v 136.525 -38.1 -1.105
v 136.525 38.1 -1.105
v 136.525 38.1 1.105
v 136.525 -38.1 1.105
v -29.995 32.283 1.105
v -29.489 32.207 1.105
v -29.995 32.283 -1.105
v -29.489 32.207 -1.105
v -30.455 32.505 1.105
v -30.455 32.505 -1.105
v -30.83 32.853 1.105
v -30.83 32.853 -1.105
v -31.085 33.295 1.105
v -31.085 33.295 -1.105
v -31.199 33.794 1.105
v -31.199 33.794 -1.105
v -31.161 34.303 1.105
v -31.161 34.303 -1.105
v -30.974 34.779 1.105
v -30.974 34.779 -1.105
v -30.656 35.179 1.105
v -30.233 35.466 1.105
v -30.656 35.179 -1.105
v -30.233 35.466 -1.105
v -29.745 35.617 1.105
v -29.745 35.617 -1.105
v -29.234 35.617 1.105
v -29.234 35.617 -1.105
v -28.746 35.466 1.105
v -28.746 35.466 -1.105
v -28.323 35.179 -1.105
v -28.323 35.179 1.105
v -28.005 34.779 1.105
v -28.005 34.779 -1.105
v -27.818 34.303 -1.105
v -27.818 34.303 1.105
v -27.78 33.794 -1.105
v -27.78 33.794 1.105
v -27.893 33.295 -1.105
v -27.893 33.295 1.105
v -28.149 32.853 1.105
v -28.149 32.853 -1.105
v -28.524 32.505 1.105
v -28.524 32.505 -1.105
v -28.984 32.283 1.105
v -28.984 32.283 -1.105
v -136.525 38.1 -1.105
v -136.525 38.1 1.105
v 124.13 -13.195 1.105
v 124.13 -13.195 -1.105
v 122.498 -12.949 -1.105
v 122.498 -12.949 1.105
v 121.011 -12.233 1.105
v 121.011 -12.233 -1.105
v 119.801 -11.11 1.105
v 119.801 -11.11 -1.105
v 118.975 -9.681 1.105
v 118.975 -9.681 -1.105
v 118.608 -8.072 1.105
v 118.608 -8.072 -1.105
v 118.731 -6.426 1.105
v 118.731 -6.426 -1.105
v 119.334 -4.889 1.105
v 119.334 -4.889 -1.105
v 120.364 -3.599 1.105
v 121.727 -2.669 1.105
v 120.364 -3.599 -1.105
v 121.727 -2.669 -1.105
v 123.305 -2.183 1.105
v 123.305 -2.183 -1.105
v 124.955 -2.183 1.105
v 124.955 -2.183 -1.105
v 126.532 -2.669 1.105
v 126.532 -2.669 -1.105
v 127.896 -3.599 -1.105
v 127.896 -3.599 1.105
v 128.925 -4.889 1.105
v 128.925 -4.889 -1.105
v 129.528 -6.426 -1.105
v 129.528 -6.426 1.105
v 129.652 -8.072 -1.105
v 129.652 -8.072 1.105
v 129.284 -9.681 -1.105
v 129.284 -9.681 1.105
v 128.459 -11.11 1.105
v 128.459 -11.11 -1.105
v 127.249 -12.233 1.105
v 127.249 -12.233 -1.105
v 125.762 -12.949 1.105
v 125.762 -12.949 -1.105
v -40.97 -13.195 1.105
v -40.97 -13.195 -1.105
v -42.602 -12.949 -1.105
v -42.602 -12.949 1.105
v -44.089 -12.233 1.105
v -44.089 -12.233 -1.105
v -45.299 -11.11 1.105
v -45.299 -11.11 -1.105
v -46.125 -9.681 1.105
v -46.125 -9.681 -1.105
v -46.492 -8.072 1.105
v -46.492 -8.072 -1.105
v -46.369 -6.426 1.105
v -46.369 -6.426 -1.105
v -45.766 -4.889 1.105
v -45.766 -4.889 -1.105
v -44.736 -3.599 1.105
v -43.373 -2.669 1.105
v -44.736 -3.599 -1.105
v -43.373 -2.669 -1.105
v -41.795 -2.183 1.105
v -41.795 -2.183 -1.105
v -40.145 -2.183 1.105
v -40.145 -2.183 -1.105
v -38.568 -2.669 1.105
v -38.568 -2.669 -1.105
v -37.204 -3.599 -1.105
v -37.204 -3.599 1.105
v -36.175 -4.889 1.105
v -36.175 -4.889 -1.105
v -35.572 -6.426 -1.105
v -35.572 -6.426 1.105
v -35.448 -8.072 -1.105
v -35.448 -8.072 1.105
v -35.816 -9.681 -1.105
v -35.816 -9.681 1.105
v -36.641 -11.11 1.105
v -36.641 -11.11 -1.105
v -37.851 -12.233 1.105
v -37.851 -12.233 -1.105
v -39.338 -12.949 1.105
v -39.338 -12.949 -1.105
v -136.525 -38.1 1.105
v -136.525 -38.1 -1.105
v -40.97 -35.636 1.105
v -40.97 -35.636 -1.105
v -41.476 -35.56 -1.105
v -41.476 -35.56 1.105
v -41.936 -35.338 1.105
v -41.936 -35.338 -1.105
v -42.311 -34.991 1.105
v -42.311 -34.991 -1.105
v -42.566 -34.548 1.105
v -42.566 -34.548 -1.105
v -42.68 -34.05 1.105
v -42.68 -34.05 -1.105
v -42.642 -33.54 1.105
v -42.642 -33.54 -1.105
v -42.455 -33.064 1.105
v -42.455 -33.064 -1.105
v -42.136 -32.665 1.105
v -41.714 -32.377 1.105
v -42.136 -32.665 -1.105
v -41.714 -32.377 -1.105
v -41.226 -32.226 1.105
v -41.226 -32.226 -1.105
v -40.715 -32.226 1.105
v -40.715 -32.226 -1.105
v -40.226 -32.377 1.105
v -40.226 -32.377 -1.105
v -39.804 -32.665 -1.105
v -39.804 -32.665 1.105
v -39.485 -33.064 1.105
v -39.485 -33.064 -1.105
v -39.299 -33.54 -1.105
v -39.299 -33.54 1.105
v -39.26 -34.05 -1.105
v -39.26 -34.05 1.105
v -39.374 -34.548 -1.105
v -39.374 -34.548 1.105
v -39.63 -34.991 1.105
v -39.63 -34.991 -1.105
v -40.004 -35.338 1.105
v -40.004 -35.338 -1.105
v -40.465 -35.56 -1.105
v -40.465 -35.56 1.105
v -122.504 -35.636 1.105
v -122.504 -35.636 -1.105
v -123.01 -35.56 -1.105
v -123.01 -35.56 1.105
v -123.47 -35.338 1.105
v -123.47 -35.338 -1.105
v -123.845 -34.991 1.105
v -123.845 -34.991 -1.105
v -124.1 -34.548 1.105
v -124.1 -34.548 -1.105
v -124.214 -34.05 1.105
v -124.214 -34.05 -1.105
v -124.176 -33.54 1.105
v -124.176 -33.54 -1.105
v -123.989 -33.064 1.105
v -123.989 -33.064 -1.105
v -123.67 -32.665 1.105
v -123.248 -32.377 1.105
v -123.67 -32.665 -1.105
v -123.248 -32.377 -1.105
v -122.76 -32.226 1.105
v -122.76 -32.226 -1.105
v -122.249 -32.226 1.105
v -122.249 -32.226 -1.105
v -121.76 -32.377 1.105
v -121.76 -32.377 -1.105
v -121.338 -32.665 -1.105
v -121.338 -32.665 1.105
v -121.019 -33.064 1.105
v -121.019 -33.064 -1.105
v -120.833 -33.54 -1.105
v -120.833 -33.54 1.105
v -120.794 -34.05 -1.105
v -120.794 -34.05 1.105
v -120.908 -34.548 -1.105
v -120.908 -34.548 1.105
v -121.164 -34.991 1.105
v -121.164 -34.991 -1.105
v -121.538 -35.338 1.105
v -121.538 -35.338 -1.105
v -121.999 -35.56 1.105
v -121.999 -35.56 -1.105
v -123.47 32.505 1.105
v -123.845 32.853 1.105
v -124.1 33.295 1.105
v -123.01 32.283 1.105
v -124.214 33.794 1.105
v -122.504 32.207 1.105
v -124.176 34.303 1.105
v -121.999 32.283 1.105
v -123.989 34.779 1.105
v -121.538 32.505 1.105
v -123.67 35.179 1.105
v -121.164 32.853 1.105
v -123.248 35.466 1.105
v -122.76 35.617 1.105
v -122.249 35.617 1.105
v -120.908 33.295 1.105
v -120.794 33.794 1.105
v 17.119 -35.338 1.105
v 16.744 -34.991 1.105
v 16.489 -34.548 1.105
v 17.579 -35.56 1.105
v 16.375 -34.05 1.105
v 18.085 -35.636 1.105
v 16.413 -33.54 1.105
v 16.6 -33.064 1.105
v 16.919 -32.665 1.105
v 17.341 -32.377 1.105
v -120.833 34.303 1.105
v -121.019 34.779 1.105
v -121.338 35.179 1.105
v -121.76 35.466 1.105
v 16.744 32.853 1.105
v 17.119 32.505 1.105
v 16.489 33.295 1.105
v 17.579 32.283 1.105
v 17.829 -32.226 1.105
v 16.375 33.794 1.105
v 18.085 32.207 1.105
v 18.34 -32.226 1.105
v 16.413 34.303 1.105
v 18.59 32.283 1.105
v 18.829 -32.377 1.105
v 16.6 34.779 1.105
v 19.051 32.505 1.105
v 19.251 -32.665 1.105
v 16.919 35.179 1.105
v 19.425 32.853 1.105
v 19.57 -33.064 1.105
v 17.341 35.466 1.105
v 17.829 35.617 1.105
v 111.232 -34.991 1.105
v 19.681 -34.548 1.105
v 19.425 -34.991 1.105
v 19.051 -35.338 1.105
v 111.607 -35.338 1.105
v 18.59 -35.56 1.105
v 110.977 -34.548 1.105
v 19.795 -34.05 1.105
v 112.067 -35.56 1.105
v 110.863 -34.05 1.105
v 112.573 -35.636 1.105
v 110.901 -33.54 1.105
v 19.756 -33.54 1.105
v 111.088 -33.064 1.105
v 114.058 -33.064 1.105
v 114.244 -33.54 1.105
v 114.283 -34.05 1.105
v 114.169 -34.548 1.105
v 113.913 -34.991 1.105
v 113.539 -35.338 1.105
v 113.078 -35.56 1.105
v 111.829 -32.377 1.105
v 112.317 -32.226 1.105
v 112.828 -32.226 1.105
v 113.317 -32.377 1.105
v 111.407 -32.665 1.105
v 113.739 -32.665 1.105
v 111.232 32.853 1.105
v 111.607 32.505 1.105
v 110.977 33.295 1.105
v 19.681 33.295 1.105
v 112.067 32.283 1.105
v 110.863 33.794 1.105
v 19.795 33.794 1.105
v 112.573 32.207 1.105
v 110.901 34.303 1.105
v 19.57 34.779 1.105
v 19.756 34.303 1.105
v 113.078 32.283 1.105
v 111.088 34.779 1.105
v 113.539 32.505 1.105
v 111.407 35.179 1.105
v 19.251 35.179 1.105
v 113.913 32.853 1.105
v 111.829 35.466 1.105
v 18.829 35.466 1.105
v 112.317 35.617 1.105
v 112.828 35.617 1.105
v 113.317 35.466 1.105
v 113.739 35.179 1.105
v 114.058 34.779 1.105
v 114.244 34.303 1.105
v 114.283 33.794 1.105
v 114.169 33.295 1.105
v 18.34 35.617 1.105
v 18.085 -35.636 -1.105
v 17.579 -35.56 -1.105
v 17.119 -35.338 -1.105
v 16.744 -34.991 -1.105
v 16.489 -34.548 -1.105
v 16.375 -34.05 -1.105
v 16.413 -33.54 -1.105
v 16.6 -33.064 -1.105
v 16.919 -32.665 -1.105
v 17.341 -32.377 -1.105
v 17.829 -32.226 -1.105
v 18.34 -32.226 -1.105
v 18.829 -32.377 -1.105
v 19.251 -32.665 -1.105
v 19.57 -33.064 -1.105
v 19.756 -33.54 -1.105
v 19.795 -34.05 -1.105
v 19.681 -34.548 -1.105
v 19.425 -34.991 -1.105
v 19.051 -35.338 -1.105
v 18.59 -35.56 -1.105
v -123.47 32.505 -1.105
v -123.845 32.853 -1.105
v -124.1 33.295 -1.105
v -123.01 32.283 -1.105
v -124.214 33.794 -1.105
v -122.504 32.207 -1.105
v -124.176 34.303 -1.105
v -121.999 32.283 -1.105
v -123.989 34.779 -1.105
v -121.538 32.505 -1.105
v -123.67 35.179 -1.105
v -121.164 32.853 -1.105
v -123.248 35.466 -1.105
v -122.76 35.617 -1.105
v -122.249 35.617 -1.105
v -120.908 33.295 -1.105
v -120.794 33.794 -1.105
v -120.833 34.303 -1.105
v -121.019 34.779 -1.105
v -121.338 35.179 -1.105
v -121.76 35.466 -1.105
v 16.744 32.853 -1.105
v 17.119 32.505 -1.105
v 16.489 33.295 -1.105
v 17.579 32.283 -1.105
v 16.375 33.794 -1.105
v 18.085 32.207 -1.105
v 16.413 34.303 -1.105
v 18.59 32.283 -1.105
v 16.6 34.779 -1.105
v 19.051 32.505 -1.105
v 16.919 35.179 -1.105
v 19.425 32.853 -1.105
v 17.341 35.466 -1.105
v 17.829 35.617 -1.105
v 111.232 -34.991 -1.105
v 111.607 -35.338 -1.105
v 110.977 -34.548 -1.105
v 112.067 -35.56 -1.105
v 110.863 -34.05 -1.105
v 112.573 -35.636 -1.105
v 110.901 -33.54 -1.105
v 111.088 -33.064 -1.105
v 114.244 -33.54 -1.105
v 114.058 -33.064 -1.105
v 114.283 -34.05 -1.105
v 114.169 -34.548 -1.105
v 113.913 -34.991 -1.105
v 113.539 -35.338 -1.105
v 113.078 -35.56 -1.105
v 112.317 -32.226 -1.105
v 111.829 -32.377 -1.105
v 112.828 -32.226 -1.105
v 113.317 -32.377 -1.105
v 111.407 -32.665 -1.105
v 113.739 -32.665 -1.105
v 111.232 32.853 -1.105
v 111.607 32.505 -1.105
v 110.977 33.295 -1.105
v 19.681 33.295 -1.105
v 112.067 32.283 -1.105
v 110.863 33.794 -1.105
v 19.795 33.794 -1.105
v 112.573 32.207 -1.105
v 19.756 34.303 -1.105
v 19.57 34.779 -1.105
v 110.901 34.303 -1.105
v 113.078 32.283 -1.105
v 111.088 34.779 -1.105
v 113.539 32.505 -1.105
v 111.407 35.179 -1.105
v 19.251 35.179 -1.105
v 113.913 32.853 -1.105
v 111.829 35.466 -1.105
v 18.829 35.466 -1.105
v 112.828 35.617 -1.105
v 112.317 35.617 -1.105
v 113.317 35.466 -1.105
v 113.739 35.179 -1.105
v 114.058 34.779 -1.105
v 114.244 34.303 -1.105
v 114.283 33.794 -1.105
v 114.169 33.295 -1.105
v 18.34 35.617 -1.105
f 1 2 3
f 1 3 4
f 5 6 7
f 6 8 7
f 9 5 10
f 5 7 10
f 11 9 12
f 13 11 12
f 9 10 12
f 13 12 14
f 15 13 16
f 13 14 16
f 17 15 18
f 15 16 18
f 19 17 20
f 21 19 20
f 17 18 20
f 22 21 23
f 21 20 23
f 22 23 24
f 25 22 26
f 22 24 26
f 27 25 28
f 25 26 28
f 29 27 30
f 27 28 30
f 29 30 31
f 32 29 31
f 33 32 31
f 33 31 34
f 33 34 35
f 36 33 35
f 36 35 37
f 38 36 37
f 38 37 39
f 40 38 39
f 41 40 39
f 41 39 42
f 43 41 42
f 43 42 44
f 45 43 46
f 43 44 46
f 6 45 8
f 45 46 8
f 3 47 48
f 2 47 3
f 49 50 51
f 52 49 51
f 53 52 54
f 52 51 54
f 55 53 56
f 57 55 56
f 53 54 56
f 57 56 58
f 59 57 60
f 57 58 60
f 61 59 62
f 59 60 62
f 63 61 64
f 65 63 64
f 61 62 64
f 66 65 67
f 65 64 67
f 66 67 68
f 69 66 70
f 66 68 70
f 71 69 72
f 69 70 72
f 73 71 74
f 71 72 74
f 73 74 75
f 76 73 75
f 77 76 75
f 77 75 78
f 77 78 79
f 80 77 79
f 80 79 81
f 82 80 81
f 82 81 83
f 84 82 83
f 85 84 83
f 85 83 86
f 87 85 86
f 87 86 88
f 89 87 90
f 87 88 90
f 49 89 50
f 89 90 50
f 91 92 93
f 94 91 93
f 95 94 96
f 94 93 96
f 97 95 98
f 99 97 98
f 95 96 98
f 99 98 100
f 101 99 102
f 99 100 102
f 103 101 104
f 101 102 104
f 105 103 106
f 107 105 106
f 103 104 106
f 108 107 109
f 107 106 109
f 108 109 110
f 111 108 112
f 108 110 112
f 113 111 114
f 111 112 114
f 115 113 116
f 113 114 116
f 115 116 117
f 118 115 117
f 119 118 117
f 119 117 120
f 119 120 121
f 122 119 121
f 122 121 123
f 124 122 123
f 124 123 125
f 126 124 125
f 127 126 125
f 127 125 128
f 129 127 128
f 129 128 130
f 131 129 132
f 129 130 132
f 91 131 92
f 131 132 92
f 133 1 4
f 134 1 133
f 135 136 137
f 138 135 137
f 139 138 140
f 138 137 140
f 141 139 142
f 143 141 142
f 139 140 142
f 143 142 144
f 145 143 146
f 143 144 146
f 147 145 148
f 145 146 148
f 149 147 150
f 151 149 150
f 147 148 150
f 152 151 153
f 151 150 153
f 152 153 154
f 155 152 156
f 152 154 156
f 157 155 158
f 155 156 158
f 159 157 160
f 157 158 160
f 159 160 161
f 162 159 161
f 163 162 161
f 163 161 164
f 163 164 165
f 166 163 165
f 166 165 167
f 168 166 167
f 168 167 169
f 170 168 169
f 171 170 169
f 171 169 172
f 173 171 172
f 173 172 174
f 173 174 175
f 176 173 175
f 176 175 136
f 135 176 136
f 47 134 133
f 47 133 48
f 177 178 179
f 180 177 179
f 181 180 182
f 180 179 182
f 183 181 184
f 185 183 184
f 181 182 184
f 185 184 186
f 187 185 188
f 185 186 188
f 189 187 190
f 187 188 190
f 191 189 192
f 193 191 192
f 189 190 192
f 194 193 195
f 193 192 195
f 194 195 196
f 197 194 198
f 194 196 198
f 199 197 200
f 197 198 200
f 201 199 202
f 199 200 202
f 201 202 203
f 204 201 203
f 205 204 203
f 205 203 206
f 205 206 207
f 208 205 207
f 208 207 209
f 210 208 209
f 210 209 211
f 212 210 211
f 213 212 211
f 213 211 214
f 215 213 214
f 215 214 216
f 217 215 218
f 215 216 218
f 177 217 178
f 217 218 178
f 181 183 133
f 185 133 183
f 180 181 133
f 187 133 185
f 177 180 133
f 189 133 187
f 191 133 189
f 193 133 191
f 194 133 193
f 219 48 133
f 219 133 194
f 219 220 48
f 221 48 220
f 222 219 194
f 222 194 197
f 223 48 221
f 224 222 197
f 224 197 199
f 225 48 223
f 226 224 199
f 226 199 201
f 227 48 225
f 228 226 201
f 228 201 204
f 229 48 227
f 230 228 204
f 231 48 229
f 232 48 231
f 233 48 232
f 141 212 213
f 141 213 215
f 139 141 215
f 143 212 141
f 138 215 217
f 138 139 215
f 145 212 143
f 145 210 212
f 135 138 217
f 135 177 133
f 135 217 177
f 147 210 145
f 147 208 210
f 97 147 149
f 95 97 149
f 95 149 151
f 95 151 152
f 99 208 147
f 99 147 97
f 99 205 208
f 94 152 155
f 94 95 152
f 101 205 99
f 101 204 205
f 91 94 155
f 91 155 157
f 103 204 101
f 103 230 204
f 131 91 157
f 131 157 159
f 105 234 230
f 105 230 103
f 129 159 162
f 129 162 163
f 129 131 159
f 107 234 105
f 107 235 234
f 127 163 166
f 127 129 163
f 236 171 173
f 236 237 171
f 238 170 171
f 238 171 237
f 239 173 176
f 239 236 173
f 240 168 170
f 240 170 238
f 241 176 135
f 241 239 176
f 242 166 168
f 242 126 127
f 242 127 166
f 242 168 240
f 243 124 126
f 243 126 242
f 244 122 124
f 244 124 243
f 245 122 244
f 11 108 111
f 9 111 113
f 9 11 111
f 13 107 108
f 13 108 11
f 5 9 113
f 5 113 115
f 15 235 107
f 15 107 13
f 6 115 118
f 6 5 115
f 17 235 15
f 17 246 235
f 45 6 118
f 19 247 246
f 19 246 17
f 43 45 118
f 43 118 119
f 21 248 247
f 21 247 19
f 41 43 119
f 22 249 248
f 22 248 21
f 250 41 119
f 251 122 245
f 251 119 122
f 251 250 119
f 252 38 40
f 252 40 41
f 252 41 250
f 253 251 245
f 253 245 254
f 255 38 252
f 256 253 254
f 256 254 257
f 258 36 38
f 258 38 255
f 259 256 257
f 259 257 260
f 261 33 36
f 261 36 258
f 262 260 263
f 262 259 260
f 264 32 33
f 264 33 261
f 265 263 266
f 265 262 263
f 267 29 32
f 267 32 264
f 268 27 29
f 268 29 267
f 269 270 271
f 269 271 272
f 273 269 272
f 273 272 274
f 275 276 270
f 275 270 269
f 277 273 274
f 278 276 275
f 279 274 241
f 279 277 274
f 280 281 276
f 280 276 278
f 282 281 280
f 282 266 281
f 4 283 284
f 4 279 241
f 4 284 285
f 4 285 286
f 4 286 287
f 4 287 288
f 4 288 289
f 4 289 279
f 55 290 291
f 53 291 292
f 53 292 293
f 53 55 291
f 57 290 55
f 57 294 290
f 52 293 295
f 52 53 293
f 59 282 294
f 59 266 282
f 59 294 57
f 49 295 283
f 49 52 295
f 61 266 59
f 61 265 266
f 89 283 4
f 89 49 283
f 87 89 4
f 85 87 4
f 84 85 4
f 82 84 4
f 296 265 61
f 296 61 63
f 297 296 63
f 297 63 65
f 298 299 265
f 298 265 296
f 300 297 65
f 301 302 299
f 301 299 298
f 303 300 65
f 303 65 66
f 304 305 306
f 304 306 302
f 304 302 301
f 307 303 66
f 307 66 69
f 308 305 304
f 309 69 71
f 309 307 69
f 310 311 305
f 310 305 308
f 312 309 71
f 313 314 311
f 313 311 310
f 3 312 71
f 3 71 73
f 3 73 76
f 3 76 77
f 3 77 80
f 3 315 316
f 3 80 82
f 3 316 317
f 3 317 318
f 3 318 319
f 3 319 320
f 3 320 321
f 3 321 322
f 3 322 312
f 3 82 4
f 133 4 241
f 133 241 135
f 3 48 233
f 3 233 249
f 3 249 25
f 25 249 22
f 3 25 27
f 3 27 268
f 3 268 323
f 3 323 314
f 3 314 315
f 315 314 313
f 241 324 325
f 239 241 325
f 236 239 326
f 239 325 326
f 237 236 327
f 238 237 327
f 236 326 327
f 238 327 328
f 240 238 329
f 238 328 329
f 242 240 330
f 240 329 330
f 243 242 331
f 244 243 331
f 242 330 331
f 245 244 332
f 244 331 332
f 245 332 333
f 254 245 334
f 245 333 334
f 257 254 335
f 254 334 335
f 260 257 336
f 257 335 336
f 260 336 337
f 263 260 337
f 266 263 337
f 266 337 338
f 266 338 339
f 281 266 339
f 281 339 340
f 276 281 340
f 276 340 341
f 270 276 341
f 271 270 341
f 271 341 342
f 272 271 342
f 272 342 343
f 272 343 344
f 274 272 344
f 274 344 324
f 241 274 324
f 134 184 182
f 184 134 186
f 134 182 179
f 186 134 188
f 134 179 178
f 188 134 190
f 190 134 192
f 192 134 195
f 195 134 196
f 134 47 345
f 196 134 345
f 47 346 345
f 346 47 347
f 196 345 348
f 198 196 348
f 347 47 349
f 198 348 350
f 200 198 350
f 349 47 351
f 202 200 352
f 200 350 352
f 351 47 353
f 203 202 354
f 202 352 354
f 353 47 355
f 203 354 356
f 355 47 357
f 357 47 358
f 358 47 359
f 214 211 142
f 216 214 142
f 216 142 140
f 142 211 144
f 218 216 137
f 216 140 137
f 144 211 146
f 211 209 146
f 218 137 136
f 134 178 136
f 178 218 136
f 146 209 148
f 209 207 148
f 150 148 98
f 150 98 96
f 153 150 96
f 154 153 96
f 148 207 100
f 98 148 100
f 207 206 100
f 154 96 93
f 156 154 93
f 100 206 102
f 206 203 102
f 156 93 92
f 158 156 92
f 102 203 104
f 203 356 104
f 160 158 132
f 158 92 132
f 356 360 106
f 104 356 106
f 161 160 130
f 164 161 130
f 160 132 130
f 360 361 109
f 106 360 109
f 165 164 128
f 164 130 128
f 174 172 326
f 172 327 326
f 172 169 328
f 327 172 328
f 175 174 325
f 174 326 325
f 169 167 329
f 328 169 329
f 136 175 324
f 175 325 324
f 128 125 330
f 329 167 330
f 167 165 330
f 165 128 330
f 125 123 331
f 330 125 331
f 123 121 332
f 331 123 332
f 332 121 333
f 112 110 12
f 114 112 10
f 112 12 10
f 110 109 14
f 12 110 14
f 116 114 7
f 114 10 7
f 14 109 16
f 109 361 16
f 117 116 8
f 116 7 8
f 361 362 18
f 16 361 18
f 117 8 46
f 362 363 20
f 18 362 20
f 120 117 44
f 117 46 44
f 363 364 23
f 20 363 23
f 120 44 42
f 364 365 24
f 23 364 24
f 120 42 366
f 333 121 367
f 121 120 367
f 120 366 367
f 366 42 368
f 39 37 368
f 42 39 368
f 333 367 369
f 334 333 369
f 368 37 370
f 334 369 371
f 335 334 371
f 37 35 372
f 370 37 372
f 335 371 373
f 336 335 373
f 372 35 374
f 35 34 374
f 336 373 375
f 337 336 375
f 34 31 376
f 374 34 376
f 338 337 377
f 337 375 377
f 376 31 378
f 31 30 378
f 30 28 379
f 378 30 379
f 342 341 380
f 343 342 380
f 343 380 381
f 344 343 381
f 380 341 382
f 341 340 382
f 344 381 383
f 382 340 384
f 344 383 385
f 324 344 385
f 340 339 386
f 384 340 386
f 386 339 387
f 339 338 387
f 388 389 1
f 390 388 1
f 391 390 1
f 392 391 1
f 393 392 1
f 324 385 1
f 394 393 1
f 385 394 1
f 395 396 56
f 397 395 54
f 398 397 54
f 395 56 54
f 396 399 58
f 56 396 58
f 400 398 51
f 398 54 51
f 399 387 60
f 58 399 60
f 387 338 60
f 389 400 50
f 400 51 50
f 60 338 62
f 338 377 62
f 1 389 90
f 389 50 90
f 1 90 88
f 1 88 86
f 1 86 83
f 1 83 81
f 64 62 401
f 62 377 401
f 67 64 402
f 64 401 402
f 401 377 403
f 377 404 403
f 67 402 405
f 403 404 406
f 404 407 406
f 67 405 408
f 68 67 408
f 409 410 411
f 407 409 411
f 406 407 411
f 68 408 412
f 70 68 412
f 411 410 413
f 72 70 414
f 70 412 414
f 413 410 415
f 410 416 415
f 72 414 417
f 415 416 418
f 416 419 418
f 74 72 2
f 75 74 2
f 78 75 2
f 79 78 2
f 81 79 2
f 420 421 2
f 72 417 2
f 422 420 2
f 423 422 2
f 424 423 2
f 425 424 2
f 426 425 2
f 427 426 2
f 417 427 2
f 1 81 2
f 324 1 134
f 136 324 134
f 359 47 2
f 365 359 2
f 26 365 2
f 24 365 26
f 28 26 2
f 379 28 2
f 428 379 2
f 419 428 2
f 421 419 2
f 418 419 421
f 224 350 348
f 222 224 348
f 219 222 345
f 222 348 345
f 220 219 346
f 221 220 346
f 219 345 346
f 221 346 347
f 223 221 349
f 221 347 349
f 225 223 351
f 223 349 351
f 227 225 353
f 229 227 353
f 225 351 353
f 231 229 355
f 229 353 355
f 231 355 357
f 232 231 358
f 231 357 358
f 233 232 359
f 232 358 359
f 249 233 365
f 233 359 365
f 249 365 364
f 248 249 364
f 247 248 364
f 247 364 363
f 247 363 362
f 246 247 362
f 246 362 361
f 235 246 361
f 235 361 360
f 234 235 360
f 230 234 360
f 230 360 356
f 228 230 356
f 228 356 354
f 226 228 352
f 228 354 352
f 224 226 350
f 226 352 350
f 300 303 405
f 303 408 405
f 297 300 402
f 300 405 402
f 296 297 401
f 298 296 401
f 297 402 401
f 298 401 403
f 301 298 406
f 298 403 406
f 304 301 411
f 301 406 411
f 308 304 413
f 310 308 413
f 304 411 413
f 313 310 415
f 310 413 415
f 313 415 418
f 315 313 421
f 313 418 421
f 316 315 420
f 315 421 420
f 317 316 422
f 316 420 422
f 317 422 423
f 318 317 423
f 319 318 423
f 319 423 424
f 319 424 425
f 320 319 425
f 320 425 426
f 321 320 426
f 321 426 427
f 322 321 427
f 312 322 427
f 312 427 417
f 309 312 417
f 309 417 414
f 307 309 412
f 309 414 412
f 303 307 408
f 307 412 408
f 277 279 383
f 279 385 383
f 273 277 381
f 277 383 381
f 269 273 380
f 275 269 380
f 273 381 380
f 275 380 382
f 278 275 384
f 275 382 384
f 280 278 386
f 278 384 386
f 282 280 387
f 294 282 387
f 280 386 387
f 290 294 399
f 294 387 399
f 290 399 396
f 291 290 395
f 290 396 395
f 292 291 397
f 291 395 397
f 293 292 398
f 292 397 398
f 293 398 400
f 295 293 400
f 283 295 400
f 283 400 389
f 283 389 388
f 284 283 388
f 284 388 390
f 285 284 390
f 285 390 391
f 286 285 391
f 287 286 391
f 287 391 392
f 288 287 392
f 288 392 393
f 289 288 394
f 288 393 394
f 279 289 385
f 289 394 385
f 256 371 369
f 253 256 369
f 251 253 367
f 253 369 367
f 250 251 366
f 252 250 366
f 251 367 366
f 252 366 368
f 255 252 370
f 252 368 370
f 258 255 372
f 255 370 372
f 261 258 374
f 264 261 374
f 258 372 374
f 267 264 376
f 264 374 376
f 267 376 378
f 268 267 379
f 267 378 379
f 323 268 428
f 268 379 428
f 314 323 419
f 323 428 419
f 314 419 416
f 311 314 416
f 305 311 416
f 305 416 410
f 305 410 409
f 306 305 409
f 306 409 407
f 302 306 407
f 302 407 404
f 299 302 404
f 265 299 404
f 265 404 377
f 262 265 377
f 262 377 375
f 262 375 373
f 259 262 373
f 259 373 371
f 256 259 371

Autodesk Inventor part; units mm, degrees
ref_plane "YZ Plane" through (0, 0, 0) normal (1, 0, 0) x (0, 1, 0)
ref_plane "XZ Plane" through (0, 0, 0) normal (0, 1, 0) x (-1, 0, 0)
ref_plane "XY Plane" through (0, 0, 0) normal (0, 0, 1) x (1, 0, 0)
sketch "Sketch1" plane through (0, 0, 0) normal (0, 0, 1) x (1, 0, 0)
  line L0 (-136.525, 38.1) -> (136.525, 38.1)
  line L1 (136.525, 38.1) -> (136.525, -38.1)
  line L2 (136.525, -38.1) -> (-136.525, -38.1)
  line L3 (-136.525, -38.1) -> (-136.525, 38.1)
  line L4 (0, 0) -> (0, 38.1) construction
  line L5 (0, 0) -> (0, -38.1) construction
  line L6 (0, 0) -> (-136.525, 0) construction
  line L7 (0, 0) -> (136.525, 0) construction
  dimension "d0" = 273.05
  dimension "d1" = 76.2
extrude "PCB" add sketch "Sketch1" along normal mid plane 2.2098
sketch "Sketch2" plane through (0, 0, 1.1049) normal (0, 0, 1) x (1, 0, 0)
  line L0 (-136.525, 38.1) -> (136.525, 38.1) projected
  line L1 (-136.525, -38.1) -> (-136.525, 38.1) projected
  line L2 (136.525, -38.1) -> (-136.525, -38.1) projected
  line L3 (-122.5042, 33.9217) -> (-122.5042, 38.1) construction
  line L4 (-122.5042, -33.9217) -> (-122.5042, -38.1) construction
  point P0 (-29.4894, 33.9217)
  point P1 (18.0848, 33.9217)
  point P2 (112.5728, 33.9217)
  point P3 (-40.9702, -33.9217)
  point P4 (18.0848, -33.9217)
  point P5 (112.5728, -33.9217)
  dimension "d4" = 67.8434
  dimension "d5" = 14.0208
  dimension "d6" = 93.0148
  dimension "d7" = 47.5742
  dimension "d8" = 94.488
  dimension "d9" = 81.534
hole "Hole1" at (-122.5042, 33.9217, 1.1049) at (-122.5042, -33.9217, 1.1049) at (-29.4894, 33.9217, 1.1049) at (18.0848, 33.9217, 1.1049) at (112.5728, 33.9217, 1.1049) at (-40.9702, -33.9217, 1.1049) at (18.0848, -33.9217, 1.1049) at (112.5728, -33.9217, 1.1049) direction (0, 0, -1) diameter 3.429 end through all
sketch "Sketch3" plane through (0, 0, 1.1049) normal (0, 0, 1) x (1, 0, 0)
  circle A0 centre (18.0848, -33.9217) radius 1.7145 projected
  circle A1 centre (-40.9702, -33.9217) radius 1.7145 projected
  point P0 (-40.9702, -7.6581)
  point P1 (124.1298, -7.6581)
  dimension "d17" = 165.1
  dimension "d18" = 26.2636
  dimension "d19" = 59.055
hole "Hole2" at (-40.9702, -7.6581, 1.1049) at (124.1298, -7.6581, 1.1049) direction (0, 0, -1) diameter 11.0744 end through all
properties part number "cRIO Electric Board 1764" material "Phenolic"
